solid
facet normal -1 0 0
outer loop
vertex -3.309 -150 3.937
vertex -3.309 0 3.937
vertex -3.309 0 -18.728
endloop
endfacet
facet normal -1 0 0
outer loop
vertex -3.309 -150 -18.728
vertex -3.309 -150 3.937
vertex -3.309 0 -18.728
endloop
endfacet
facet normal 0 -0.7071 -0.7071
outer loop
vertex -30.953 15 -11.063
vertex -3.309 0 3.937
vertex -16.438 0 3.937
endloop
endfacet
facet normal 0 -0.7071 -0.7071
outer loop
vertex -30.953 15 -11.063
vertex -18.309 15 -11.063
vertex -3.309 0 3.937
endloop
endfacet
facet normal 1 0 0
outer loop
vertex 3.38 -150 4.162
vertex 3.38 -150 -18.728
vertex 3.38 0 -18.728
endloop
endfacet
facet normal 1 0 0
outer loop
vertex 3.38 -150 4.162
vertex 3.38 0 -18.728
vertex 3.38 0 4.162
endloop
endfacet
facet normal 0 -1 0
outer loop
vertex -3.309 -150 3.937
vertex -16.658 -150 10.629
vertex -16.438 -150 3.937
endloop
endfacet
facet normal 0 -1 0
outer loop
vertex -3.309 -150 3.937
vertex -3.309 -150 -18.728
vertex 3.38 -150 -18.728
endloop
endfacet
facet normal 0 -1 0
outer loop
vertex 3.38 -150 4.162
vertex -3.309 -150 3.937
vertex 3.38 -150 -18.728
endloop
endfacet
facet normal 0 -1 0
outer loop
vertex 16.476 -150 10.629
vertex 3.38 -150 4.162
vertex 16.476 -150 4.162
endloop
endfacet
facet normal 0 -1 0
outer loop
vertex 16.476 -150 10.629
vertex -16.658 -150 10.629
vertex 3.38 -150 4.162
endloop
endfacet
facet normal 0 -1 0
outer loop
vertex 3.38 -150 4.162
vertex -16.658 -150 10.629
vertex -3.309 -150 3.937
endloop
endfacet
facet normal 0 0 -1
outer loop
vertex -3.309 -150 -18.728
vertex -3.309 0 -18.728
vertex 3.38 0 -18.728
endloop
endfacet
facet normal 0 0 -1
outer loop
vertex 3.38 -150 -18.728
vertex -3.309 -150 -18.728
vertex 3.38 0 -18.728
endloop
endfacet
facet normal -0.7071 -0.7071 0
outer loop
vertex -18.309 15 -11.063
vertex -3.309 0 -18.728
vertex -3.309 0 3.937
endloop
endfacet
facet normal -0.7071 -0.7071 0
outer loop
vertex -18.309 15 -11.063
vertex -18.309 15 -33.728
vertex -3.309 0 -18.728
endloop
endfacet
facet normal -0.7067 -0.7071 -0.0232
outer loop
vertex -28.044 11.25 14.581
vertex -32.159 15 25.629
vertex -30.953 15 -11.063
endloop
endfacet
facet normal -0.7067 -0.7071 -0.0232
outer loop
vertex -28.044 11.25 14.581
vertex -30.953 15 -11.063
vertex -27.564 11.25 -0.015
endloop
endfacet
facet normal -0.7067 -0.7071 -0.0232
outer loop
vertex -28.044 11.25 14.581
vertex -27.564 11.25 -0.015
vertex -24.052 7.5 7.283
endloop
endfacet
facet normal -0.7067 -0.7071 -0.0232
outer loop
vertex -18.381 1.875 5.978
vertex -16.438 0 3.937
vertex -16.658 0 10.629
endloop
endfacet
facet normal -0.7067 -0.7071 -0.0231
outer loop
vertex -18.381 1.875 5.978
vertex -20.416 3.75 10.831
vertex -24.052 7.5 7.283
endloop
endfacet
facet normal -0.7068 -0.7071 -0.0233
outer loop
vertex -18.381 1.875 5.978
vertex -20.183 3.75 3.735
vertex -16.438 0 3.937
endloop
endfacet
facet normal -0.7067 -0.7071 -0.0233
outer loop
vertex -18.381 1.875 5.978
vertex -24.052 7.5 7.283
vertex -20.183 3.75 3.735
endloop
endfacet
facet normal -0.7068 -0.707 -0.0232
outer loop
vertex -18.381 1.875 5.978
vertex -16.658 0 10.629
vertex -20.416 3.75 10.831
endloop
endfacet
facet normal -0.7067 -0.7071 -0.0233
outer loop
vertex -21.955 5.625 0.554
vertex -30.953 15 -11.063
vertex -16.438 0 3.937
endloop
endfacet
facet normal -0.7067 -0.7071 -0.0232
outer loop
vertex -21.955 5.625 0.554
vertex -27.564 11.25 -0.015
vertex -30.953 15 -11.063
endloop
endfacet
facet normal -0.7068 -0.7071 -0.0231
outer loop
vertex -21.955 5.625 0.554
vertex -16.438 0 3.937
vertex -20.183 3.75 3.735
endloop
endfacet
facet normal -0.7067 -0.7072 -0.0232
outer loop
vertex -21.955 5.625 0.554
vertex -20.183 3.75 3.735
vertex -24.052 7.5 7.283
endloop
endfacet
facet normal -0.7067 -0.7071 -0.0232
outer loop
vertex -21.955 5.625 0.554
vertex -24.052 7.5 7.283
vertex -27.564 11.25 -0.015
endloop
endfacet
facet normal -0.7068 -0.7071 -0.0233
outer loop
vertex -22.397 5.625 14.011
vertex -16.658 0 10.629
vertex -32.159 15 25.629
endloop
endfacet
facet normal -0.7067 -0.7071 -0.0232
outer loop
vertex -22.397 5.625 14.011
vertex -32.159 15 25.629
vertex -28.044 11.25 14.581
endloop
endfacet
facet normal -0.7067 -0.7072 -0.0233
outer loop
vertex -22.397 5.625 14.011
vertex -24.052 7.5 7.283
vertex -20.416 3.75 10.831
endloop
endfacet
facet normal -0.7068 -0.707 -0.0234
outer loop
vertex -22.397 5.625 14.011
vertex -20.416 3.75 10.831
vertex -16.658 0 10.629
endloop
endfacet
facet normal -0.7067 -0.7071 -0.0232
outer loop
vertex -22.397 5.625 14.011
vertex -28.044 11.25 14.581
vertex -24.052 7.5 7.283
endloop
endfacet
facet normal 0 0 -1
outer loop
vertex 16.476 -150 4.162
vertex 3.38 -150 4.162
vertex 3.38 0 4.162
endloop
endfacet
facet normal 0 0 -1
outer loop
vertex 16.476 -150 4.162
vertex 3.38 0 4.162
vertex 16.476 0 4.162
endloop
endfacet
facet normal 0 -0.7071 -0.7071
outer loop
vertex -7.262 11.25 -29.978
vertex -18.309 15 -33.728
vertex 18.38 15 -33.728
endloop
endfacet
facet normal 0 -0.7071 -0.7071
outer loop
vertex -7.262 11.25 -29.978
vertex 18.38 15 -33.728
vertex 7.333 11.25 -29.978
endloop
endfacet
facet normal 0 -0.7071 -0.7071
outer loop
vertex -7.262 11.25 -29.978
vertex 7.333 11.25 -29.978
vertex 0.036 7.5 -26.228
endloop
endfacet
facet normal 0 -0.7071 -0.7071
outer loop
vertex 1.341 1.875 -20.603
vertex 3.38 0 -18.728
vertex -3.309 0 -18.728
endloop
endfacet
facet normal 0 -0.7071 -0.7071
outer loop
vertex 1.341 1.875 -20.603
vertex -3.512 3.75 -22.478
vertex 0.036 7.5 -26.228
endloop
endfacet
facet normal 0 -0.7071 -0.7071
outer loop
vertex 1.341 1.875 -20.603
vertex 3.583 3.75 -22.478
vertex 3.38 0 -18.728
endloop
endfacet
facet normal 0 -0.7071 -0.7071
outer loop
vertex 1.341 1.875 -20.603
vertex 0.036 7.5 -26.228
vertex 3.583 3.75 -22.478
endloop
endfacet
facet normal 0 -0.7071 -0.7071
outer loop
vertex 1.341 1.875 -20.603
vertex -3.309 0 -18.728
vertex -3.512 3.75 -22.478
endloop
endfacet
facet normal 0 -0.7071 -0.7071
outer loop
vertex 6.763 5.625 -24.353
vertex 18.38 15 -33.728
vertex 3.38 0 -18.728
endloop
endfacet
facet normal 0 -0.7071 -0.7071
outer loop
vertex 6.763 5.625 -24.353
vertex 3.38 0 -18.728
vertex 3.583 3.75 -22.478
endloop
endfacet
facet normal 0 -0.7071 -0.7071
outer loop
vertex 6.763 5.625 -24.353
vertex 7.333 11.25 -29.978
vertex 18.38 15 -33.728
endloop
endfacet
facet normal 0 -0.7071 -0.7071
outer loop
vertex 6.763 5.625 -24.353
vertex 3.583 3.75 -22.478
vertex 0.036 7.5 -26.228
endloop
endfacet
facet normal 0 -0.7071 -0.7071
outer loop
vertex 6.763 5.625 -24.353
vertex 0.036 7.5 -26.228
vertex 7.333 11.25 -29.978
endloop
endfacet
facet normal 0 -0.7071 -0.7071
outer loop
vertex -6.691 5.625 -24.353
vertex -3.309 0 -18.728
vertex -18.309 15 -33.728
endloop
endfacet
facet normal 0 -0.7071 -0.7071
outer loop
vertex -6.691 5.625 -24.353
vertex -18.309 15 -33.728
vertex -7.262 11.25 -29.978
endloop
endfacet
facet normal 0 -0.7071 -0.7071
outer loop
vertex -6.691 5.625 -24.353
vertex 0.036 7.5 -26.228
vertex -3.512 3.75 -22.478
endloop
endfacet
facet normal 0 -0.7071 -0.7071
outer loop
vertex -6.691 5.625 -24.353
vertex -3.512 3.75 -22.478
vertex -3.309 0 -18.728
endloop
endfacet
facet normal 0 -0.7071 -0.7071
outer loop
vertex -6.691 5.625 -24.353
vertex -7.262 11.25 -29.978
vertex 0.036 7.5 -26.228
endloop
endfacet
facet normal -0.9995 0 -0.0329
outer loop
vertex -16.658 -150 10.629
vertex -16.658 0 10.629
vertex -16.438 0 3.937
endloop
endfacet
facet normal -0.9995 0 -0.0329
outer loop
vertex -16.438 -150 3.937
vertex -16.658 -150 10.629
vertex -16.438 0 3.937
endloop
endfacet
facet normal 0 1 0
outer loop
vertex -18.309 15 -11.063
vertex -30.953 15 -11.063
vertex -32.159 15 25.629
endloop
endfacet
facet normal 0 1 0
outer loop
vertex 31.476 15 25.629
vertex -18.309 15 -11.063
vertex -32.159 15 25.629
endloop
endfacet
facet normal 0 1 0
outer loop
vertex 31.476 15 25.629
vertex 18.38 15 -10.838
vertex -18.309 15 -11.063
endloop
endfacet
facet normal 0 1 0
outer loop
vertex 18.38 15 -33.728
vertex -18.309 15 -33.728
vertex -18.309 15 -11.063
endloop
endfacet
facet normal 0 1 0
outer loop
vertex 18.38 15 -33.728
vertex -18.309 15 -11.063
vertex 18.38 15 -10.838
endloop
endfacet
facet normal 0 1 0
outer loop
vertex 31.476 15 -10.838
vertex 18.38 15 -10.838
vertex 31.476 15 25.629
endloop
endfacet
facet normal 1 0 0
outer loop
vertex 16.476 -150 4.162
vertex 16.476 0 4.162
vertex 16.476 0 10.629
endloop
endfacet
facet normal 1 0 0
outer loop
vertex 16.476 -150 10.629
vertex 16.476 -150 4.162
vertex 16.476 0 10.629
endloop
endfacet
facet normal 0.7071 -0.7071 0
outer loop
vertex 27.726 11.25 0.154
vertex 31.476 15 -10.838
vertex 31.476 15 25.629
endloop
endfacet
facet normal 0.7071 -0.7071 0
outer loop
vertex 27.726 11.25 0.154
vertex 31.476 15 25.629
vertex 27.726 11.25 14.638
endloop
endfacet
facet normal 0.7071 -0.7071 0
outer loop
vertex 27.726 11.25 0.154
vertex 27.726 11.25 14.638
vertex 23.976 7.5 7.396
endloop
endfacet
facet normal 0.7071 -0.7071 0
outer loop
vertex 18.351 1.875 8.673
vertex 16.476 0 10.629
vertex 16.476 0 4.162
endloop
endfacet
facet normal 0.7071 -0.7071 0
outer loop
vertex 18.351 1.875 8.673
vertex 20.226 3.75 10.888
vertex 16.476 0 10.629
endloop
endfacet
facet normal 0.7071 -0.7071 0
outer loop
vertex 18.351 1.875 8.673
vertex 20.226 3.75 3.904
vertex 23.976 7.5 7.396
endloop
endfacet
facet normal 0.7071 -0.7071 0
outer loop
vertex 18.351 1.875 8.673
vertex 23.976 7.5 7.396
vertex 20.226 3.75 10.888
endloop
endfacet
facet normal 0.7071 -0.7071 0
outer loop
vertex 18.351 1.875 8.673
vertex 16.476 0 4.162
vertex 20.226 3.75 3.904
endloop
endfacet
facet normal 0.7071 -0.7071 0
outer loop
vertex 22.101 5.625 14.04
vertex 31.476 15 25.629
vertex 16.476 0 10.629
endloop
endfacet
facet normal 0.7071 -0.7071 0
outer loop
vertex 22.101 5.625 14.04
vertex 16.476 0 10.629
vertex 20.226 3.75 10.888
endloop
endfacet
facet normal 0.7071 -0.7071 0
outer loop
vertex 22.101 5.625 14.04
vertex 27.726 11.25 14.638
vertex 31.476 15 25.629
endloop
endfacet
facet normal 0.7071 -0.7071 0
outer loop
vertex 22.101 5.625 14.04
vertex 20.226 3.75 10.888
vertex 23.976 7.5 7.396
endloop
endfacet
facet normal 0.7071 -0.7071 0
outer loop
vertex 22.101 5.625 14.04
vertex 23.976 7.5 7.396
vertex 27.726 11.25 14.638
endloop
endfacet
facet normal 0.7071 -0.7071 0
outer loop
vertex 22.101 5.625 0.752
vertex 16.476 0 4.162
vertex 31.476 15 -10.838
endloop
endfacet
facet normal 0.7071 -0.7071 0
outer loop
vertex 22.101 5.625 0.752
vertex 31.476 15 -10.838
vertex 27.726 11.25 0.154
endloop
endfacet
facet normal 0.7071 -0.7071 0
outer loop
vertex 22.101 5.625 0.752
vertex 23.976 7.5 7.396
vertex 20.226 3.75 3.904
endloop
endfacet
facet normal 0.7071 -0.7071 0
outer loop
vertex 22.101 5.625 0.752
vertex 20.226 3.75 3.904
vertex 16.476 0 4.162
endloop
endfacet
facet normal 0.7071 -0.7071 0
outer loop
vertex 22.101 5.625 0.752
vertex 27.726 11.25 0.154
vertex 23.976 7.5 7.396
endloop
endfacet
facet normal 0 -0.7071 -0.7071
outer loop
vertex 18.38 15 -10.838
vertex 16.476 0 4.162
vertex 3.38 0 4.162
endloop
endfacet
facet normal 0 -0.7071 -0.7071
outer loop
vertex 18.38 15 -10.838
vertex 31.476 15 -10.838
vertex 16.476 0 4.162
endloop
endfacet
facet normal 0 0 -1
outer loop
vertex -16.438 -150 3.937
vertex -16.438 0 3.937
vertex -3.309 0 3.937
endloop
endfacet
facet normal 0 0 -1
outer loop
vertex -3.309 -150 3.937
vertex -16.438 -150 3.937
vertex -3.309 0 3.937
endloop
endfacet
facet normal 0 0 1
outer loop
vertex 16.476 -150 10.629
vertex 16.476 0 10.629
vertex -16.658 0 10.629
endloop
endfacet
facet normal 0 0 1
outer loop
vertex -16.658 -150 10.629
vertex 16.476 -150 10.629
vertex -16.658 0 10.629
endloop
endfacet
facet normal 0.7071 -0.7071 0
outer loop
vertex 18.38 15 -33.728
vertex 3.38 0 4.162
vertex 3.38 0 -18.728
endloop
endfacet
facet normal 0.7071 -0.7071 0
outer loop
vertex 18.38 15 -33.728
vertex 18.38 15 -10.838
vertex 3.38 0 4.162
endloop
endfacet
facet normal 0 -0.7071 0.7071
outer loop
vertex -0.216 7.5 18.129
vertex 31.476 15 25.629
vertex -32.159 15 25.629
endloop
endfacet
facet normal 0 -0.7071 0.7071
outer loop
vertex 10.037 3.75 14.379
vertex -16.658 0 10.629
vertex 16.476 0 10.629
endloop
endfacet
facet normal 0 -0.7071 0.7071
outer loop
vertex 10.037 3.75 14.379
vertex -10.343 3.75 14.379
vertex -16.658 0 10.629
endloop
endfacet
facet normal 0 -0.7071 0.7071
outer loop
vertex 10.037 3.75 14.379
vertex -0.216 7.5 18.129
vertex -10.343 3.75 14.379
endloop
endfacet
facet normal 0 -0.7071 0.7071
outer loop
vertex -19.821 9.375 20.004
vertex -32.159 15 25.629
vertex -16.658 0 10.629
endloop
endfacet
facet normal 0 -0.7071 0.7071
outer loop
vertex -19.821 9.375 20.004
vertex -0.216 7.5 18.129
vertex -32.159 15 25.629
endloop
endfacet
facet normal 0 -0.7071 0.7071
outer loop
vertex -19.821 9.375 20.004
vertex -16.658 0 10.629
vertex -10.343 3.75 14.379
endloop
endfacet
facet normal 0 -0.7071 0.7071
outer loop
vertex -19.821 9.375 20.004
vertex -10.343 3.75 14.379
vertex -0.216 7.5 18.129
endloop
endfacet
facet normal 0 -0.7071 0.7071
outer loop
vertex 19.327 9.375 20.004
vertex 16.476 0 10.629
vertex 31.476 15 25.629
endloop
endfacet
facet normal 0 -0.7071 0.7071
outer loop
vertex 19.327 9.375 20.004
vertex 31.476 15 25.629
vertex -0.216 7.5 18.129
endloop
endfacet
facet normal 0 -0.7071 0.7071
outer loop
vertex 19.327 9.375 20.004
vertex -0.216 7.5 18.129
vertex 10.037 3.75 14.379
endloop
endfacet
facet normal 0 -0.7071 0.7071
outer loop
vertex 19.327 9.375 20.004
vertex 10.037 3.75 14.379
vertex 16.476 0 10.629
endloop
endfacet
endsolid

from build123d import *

# Parameters (mm, degrees)
F1_DEPTH = 150
F3_DEPTH = 15
F3_TAPER = -45


with BuildPart() as f1:
    # F0 (on Front) → F1 (new body)
    with BuildSketch(Plane.XZ):
        Polygon((16.4764662622, 10.6293191202), (-16.6578079225, 10.6293191202), (-16.4379915805, 3.9366264828), (-3.308858315, 3.9366264828), (-3.308858315, -18.7284196727), (3.3802918042, -18.7284196727), (3.3802918042, 4.1624740697), (16.4764662622, 4.1624740697), align=None)
    extrude(amount=F1_DEPTH)

    # F2 (on face) → F3 (join)
    with BuildSketch(Plane(origin=(0, 0, 0), x_dir=(-1, 0, 0), z_dir=(0, 1, 0))):
        Polygon((16.4379915805, 3.9366264828), (16.6578079225, 10.6293191202), (-16.4764662622, 10.6293191202), (-16.4764662622, 4.1624740697), (-3.3802918042, 4.1624740697), (-3.3802918042, -18.7284196727), (3.308858315, -18.7284196727), (3.308858315, 3.9366264828), align=None)
    extrude(amount=F3_DEPTH, taper=F3_TAPER)


solid = f1.part
